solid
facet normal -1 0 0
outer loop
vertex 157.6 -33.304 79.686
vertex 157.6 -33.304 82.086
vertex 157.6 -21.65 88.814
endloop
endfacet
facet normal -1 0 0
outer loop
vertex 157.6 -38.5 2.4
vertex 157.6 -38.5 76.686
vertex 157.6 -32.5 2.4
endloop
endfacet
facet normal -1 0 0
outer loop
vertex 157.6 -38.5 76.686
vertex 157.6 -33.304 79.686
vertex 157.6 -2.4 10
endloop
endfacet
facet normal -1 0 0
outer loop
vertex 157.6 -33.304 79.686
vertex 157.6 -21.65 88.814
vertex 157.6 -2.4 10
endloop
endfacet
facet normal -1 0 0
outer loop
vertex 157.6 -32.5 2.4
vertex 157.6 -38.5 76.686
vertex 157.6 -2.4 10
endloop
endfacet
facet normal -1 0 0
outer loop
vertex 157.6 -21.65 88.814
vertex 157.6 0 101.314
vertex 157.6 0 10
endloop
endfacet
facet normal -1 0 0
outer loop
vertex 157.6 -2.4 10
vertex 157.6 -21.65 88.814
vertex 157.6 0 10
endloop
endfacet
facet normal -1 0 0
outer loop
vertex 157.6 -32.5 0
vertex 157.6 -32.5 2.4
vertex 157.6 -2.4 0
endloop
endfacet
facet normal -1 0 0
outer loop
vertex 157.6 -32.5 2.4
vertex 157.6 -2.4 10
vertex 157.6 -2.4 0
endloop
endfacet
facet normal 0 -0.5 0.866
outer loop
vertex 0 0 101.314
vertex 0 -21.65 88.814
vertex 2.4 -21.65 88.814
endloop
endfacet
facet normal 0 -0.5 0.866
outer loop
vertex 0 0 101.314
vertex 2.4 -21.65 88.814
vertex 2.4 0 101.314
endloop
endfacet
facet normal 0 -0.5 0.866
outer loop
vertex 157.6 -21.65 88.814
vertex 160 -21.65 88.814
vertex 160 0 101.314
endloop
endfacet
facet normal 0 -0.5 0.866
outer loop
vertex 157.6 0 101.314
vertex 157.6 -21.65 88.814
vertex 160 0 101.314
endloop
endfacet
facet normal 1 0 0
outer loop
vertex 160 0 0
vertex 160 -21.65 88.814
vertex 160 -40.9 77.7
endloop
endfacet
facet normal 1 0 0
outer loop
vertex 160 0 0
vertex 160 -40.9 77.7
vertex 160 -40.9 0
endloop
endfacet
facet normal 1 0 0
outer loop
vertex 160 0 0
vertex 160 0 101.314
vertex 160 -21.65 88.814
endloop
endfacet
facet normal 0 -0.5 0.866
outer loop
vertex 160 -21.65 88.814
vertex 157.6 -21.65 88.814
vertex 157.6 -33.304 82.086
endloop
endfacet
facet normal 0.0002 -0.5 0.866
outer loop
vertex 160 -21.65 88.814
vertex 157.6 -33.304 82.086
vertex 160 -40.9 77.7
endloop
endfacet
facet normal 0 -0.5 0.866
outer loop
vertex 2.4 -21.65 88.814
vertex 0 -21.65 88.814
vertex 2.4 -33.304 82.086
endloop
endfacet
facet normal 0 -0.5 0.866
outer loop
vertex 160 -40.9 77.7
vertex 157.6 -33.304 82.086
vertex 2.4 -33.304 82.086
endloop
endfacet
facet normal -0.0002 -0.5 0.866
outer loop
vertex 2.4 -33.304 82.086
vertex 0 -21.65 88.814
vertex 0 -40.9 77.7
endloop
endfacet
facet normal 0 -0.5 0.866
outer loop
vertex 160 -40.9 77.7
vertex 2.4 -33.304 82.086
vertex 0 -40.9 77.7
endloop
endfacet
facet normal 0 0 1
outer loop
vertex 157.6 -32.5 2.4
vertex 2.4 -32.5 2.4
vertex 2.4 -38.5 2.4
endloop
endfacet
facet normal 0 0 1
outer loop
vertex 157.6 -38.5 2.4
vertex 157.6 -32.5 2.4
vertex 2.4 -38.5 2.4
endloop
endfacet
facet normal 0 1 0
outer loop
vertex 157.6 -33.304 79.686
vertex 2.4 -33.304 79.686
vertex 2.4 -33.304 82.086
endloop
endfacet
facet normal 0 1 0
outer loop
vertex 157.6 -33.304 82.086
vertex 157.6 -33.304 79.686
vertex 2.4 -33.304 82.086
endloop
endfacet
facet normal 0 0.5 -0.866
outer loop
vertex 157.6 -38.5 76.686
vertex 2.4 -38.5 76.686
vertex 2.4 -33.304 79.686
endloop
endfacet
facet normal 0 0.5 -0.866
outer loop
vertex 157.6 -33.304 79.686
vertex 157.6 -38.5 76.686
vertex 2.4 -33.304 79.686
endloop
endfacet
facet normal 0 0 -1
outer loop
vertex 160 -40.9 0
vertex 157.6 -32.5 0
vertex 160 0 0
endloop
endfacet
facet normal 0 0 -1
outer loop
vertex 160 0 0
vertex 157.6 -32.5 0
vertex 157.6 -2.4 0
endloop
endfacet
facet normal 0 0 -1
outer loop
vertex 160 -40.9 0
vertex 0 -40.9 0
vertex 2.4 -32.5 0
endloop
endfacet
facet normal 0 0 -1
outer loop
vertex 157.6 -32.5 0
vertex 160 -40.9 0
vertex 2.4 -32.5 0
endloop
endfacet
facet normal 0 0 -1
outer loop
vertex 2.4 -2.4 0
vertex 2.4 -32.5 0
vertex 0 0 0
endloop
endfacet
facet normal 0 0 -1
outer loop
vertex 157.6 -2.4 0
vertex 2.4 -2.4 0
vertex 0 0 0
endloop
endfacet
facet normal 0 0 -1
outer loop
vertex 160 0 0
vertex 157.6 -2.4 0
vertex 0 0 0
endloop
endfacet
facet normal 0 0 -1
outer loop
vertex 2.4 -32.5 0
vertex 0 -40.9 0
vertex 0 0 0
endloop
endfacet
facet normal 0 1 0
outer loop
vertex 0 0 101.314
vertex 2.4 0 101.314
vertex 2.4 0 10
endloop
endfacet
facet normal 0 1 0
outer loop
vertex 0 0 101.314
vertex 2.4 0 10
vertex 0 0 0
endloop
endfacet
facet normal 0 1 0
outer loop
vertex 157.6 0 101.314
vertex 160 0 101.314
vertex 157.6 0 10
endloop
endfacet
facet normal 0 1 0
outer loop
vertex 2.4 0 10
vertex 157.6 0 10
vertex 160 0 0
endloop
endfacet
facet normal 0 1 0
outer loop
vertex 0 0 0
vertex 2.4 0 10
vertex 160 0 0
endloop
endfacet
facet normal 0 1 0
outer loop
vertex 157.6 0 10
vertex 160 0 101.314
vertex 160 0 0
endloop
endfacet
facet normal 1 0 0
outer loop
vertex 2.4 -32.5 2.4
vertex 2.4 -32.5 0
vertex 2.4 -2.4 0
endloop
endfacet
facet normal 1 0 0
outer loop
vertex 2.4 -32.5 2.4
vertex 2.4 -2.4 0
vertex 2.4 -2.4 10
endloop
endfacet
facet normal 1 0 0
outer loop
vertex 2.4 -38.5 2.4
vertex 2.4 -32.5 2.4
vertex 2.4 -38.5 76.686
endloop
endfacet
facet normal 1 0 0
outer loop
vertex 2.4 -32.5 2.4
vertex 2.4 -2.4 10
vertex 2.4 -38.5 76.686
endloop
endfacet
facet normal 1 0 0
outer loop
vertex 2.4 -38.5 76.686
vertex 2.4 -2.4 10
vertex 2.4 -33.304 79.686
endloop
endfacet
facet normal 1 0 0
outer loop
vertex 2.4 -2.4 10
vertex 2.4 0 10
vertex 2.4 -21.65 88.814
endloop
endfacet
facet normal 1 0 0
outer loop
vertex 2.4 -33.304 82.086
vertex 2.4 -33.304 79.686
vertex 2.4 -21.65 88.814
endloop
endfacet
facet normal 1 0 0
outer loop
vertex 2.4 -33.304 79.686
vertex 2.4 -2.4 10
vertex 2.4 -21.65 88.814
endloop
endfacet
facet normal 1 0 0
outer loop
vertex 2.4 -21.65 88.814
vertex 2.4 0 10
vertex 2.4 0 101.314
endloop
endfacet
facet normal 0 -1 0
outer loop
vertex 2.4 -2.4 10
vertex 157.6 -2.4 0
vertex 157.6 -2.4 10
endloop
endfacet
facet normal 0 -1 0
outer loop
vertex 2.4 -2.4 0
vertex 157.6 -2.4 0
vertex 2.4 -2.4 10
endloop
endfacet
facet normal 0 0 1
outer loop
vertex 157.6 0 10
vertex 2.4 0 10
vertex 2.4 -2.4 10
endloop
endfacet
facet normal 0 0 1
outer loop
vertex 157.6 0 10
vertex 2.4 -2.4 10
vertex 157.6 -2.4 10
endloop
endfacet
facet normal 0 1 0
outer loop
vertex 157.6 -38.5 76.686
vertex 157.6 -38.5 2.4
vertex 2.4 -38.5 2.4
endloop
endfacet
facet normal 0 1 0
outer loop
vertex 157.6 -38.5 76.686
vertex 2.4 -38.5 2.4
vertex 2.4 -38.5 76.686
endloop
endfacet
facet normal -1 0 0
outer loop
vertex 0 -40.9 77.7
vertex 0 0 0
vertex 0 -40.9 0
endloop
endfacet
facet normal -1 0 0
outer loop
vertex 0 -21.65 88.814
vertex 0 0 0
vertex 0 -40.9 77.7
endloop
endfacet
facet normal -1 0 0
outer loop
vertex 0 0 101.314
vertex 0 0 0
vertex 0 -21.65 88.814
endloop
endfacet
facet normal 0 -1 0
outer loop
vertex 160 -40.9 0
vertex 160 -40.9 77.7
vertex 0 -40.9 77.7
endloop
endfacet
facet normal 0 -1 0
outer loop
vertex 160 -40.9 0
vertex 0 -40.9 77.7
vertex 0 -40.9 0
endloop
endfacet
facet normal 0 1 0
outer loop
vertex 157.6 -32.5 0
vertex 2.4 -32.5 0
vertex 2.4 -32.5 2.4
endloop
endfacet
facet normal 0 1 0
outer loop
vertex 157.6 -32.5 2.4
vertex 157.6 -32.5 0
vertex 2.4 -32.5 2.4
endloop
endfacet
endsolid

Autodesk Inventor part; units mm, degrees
ref_plane "YZ Plane" through (0, 0, 0) normal (1, 0, 0) x (0, 1, 0)
ref_plane "XZ Plane" through (0, 0, 0) normal (0, 1, 0) x (-1, 0, 0)
ref_plane "XY Plane" through (0, 0, 0) normal (0, 0, 1) x (1, 0, 0)
sketch "Sketch1" plane through (0, 0, 0) normal (0, 0, 1) x (1, 0, 0)
  line L0 (0, 0) -> (0, -40.9)
  line L1 (0, 0) -> (160, 0)
  line L2 (160, 0) -> (160, -40.9)
  line L3 (160, -40.9) -> (157.6, -40.9)
  line L4 (157.6, -40.9) -> (157.6, -2.4)
  line L5 (157.6, -2.4) -> (2.4, -2.4)
  line L6 (2.4, -2.4) -> (2.4, -40.9)
  line L7 (2.4, -40.9) -> (0, -40.9)
  line L8 (160, -21.65) -> (157.6, -21.65)
  line L9 (2.4, -21.65) -> (0, -21.65)
  dimension "d0" = 40.9
  dimension "d1" = 160
  dimension "d2" = 2.4
  dimension "d3" = 38.5
  dimension "d4" = 155.2
extrude "Extrusion5" add sketch "Sketch1" along normal blind 77.7 contours L9 L6 L7 L0 | L2 L3 L4 L8
extrude "Extrusion6" add sketch "Sketch1" along normal blind 10 contours L1 L2 L8 L4 L5 L6 L9 L0
sketch "Sketch6" plane through (160, -40.9, 77.7) normal (1, 0, 0) x (0, 0, -1)
  line L0 (0, 0) -> (0, 19.25) projected
  line L1 (0, 19.25) -> (0, 0)
  line L2 (77.7, 0) -> (0, 0) projected
  line L3 (0, 0) -> (-11.114, 19.25)
  line L4 (0, 0) -> (22.228, 0) construction
  line L5 (-11.114, 19.25) -> (0, 19.25)
  point P0 (77.7, 40.9)
  dimension "d21" = 120
extrude "Extrusion7" add sketch "Sketch6" against normal blind 2.4
sketch "Sketch7" plane through (0, -40.9, 77.7) normal (-1, 0, 0) x (0, 0, 1)
  line L0 (0, 0) -> (0, 19.25) projected
  line L1 (0, 19.25) -> (0, 0)
  line L2 (-67.7, 19.25) -> (11.114, 19.25) projected
  line L3 (0, 0) -> (11.114, 19.25)
  line L4 (11.114, 19.25) -> (0, 19.25)
  point P0 (-77.7, 40.9)
extrude "Extrusion8" add sketch "Sketch7" against normal blind 2.4
sketch "Sketch8" plane through (2.4, -40.9, 0) normal (1, 0, 0) x (0, 0, -1)
  line L0 (0, 0) -> (0, 2.4)
  line L1 (0, 0) -> (0, 38.5) projected
  line L2 (0, 2.4) -> (-79.0856, 2.4)
  line L3 (-88.814, 19.25) -> (-77.7, 0) projected
  line L4 (-77.7, 0) -> (0, 0)
  point P0 (0, 40.9)
  dimension "d26" = 2.4
extrude "Extrusion9" add sketch "Sketch8" along normal blind 157
sketch "Sketch9" plane through (2.4, -21.65, 10) normal (1, 0, 0) x (0, 0, -1)
  line L0 (10, -16.85) -> (10, 19.25) projected
  line L1 (10, -16.85) -> (10, -10.85)
  line L2 (10, -10.85) -> (7.6, -10.85)
  line L3 (7.6, -10.85) -> (7.6, -16.85)
  line L4 (-69.0856, -16.85) -> (10, -16.85) projected
  line L5 (7.6, -16.85) -> (10, -16.85)
  line L6 (-69.0856, -16.85) -> (-66.6856, -16.85)
  line L7 (-66.6856, -16.85) -> (-69.6856, -11.6538)
  line L8 (-69.6856, -11.6538) -> (-72.0856, -11.6538)
  line L9 (-67.7, -19.25) -> (-78.814, 0) projected
  line L10 (-72.0856, -11.6538) -> (-69.0856, -16.85)
  point P0 (10, 21.65)
  dimension "d29" = 6
  dimension "d30" = 2.4
  dimension "d31" = 6
  dimension "d32" = 90
  dimension "d33" = 2.4
  dimension "d34" = 6
  dimension "d35" = 60
  dimension "d36" = 120
extrude "Extrusion10" add sketch "Sketch9" along normal blind 157
sketch "Sketch10" plane through (0, -40.9, 0) normal (-1, 0, 0) x (0, 0, 1)
  line L0 (10, 40.9) -> (10, 19.25)
  line L1 (10, 19.25) -> (88.814, 19.25)
  line L2 (10, 19.25) -> (88.814, 19.25) projected
  line L3 (88.814, 19.25) -> (101.3136, 40.9)
  line L4 (88.814, 19.25) -> (113.8133, 19.25) construction
  line L5 (101.3136, 40.9) -> (10, 40.9)
  point P0 (0, 40.9)
  dimension "d39" = 60
extrude "Extrusion11" add sketch "Sketch10" against normal blind 2.4
sketch "Sketch11" plane through (160, -40.9, 0) normal (1, 0, 0) x (0, 0, -1)
  line L0 (-10, 40.9) -> (-10, 38.5) projected
  line L1 (-10, 40.9) -> (-10, 19.25)
  line L2 (-10, 19.25) -> (-88.814, 19.25) projected
  line L3 (-10, 19.25) -> (-88.814, 19.25)
  line L4 (-88.814, 19.25) -> (-101.3136, 40.9)
  line L5 (-101.3136, 40.9) -> (-10, 40.9)
  point P0 (0, 40.9)
extrude "Extrusion12" add sketch "Sketch11" against normal blind 2.4
properties part number "Chassi_Top_Rear"
